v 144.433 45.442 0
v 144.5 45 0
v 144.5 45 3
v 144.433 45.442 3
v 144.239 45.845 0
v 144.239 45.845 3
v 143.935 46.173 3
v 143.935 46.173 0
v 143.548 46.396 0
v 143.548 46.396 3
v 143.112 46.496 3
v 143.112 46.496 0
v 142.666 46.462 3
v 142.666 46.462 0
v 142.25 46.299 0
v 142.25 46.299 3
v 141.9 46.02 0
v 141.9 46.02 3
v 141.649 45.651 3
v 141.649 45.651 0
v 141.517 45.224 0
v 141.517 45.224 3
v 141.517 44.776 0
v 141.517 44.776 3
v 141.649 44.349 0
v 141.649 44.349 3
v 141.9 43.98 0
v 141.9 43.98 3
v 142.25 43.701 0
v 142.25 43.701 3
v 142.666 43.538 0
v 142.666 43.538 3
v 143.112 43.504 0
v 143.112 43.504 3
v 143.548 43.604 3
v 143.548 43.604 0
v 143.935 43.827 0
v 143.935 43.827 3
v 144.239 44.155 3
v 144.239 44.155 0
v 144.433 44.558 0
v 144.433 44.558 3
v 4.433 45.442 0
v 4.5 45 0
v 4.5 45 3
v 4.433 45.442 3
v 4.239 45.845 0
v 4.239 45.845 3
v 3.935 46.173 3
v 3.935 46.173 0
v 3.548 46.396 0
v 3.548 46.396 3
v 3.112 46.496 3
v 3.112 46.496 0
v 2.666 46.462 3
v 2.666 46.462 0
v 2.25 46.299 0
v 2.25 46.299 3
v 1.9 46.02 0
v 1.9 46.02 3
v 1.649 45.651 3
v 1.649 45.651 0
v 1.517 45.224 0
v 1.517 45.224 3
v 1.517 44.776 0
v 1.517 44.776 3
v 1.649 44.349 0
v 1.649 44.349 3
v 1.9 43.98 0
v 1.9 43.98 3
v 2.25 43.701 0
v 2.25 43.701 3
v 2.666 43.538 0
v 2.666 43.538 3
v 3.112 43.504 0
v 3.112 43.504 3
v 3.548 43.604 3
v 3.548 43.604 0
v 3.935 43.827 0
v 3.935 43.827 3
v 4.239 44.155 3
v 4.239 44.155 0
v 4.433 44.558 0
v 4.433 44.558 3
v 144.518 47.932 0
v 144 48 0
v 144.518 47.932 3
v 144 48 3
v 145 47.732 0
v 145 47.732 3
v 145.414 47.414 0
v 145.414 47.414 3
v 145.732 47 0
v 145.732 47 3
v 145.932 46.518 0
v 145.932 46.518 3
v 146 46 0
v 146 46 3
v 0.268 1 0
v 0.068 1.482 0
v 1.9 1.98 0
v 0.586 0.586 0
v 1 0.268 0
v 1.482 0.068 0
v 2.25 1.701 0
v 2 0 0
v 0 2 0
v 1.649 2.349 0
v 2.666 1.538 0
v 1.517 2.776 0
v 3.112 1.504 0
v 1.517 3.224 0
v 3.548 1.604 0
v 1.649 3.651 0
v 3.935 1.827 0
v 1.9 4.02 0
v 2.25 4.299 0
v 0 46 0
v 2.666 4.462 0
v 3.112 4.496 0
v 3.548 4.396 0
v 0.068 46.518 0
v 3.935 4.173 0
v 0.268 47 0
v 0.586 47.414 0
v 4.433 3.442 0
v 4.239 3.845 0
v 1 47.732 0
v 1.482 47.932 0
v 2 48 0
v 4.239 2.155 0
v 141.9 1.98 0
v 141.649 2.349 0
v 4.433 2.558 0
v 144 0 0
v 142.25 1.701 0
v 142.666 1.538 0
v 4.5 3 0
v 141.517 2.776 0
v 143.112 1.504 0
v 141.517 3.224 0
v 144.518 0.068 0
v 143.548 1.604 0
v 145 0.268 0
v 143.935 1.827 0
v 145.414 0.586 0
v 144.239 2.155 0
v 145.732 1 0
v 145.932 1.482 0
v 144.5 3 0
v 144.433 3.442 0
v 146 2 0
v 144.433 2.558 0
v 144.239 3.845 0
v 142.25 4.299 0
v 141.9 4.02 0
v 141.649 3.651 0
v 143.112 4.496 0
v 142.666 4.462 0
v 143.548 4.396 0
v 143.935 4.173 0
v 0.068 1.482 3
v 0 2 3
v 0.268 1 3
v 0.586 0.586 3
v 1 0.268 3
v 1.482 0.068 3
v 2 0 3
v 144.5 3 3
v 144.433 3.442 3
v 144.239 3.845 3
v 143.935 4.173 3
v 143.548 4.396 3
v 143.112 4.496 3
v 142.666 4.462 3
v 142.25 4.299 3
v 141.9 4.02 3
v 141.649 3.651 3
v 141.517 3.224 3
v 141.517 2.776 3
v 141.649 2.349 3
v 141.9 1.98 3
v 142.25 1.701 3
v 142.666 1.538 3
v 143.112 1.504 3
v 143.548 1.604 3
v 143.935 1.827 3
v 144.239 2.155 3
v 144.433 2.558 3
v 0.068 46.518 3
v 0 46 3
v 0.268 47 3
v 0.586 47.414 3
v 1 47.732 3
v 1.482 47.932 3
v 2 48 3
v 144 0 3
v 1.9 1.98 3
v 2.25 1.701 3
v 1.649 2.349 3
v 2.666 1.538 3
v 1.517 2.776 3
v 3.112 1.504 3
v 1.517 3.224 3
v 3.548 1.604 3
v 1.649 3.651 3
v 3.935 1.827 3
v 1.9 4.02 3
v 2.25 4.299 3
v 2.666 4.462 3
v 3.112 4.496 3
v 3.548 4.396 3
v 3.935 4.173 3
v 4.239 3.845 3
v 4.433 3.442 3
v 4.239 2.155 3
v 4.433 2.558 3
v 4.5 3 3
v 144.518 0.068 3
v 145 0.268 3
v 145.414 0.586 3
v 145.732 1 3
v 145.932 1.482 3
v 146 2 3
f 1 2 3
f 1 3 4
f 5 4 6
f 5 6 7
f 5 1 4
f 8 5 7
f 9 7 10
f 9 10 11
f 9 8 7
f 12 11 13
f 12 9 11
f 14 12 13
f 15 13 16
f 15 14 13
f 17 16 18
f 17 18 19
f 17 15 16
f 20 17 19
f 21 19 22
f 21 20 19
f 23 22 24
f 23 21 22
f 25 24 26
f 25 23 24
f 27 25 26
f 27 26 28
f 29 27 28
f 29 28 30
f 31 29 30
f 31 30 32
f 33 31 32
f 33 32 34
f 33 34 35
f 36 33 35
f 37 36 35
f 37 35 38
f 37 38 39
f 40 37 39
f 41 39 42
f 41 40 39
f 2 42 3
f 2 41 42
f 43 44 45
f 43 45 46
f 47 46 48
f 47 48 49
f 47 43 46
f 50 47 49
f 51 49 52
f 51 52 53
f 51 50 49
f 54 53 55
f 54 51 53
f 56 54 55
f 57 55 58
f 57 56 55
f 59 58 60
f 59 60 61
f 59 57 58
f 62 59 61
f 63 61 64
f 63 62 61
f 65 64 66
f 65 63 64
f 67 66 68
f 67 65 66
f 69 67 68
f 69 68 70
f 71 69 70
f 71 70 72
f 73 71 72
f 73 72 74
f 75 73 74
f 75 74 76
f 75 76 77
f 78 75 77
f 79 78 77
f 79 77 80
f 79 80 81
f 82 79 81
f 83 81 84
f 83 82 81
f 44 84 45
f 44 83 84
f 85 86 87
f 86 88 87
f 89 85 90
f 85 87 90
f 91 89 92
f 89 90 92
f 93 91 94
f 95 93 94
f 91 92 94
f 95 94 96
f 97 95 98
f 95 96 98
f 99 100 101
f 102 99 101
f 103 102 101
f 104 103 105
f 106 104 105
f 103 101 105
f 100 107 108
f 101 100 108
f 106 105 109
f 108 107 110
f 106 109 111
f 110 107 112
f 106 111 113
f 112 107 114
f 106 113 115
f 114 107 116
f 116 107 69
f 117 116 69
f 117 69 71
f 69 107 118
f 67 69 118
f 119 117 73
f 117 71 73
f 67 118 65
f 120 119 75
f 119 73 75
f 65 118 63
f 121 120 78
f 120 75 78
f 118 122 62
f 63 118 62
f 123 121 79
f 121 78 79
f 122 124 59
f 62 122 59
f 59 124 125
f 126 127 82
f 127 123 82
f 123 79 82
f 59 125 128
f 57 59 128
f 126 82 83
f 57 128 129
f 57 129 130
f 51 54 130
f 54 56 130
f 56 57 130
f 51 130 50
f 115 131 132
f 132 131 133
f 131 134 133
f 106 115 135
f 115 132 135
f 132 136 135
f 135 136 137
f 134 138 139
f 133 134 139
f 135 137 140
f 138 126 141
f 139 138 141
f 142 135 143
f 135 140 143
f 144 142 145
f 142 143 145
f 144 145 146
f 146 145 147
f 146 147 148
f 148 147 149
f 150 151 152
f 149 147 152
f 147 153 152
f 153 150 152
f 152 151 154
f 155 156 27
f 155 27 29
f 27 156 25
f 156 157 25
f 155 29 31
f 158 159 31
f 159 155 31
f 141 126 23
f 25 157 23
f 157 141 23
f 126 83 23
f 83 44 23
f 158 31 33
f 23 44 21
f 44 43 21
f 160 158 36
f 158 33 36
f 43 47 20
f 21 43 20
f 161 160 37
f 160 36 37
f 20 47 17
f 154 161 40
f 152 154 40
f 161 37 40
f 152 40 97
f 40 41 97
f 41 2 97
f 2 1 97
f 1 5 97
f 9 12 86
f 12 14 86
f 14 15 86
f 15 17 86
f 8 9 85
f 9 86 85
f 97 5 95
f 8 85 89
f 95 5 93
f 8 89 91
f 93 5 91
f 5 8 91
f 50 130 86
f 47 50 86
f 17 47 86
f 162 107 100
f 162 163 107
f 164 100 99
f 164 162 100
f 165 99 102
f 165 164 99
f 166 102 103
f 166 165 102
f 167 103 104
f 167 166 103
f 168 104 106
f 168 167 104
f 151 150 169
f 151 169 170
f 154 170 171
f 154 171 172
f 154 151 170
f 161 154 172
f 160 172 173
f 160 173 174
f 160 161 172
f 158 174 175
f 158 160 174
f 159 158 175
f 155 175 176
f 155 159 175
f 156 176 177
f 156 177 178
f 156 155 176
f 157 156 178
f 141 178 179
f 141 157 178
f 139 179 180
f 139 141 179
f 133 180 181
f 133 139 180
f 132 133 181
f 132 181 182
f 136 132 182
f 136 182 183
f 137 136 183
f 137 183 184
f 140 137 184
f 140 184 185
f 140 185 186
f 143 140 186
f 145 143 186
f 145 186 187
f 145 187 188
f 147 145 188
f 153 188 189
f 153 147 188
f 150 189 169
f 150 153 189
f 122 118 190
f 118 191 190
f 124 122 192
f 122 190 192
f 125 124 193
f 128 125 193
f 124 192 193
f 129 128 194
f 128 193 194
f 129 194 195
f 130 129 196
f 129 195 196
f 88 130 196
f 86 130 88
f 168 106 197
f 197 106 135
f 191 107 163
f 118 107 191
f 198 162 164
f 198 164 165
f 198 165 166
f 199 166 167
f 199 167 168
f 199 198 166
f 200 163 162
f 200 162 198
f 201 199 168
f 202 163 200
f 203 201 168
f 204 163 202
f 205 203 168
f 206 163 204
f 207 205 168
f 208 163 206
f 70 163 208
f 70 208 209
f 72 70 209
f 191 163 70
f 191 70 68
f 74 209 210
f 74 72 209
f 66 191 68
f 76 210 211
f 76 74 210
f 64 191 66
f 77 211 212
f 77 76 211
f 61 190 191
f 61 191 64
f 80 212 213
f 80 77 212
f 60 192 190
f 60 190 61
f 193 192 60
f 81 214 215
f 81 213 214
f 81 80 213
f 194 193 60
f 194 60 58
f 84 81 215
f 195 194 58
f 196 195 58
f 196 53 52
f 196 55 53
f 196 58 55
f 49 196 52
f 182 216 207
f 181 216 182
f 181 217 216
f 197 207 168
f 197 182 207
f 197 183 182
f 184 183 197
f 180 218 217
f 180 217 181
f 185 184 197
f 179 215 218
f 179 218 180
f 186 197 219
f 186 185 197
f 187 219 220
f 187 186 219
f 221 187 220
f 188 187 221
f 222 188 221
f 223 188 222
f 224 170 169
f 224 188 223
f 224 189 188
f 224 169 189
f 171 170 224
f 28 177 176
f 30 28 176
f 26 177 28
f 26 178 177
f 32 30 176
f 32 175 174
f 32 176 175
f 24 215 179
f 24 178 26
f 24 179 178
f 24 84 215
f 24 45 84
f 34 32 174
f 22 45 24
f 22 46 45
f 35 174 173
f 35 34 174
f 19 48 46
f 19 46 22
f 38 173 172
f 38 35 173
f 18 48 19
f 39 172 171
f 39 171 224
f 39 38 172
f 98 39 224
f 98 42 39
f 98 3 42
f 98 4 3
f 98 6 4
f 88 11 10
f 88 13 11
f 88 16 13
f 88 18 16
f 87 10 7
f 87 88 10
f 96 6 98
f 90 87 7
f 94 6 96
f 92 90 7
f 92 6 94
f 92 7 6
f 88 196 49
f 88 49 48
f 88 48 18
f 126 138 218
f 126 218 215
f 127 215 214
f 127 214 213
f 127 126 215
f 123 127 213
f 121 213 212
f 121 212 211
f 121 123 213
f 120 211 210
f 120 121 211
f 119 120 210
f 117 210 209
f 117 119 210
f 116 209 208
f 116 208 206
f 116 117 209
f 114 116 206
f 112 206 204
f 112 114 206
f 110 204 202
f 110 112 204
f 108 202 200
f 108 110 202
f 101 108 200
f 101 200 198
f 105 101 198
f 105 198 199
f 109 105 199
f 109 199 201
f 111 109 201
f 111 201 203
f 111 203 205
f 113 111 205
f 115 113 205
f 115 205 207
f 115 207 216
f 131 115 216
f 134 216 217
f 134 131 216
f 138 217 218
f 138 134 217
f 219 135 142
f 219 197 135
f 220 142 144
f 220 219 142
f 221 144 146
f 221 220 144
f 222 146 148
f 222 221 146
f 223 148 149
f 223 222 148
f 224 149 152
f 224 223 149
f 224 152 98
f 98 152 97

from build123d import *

# Parameters (mm, degrees)
SKETCH1_W           = 146
SKETCH1_H           = 48
SKETCH1_R           = 1.5
BOSS_EXTRUDE1_DEPTH = 3
FILLET1_R           = 2


with BuildPart() as part:
    # Sketch1 → Boss-Extrude1 (new body)
    with BuildSketch(Plane.XY):
        with Locations((73, 24)):
            Rectangle(SKETCH1_W, SKETCH1_H)
        with Locations((3, 45)):
            Circle(SKETCH1_R, mode=Mode.SUBTRACT)
        with Locations((3, 3)):
            Circle(SKETCH1_R, mode=Mode.SUBTRACT)
        with Locations((143, 45)):
            Circle(SKETCH1_R, mode=Mode.SUBTRACT)
        with Locations((143, 3)):
            Circle(SKETCH1_R, mode=Mode.SUBTRACT)
    extrude(amount=BOSS_EXTRUDE1_DEPTH)

    # Fillet1
    fillet1_edges = [part.edges().sort_by_distance(p)[0] for p in [
        (0, 0, 1.5),
        (0, 48, 1.5),
        (146, 48, 1.5),
        (146, 0, 1.5),
    ]]
    fillet(fillet1_edges, radius=FILLET1_R)


solid = part.part
